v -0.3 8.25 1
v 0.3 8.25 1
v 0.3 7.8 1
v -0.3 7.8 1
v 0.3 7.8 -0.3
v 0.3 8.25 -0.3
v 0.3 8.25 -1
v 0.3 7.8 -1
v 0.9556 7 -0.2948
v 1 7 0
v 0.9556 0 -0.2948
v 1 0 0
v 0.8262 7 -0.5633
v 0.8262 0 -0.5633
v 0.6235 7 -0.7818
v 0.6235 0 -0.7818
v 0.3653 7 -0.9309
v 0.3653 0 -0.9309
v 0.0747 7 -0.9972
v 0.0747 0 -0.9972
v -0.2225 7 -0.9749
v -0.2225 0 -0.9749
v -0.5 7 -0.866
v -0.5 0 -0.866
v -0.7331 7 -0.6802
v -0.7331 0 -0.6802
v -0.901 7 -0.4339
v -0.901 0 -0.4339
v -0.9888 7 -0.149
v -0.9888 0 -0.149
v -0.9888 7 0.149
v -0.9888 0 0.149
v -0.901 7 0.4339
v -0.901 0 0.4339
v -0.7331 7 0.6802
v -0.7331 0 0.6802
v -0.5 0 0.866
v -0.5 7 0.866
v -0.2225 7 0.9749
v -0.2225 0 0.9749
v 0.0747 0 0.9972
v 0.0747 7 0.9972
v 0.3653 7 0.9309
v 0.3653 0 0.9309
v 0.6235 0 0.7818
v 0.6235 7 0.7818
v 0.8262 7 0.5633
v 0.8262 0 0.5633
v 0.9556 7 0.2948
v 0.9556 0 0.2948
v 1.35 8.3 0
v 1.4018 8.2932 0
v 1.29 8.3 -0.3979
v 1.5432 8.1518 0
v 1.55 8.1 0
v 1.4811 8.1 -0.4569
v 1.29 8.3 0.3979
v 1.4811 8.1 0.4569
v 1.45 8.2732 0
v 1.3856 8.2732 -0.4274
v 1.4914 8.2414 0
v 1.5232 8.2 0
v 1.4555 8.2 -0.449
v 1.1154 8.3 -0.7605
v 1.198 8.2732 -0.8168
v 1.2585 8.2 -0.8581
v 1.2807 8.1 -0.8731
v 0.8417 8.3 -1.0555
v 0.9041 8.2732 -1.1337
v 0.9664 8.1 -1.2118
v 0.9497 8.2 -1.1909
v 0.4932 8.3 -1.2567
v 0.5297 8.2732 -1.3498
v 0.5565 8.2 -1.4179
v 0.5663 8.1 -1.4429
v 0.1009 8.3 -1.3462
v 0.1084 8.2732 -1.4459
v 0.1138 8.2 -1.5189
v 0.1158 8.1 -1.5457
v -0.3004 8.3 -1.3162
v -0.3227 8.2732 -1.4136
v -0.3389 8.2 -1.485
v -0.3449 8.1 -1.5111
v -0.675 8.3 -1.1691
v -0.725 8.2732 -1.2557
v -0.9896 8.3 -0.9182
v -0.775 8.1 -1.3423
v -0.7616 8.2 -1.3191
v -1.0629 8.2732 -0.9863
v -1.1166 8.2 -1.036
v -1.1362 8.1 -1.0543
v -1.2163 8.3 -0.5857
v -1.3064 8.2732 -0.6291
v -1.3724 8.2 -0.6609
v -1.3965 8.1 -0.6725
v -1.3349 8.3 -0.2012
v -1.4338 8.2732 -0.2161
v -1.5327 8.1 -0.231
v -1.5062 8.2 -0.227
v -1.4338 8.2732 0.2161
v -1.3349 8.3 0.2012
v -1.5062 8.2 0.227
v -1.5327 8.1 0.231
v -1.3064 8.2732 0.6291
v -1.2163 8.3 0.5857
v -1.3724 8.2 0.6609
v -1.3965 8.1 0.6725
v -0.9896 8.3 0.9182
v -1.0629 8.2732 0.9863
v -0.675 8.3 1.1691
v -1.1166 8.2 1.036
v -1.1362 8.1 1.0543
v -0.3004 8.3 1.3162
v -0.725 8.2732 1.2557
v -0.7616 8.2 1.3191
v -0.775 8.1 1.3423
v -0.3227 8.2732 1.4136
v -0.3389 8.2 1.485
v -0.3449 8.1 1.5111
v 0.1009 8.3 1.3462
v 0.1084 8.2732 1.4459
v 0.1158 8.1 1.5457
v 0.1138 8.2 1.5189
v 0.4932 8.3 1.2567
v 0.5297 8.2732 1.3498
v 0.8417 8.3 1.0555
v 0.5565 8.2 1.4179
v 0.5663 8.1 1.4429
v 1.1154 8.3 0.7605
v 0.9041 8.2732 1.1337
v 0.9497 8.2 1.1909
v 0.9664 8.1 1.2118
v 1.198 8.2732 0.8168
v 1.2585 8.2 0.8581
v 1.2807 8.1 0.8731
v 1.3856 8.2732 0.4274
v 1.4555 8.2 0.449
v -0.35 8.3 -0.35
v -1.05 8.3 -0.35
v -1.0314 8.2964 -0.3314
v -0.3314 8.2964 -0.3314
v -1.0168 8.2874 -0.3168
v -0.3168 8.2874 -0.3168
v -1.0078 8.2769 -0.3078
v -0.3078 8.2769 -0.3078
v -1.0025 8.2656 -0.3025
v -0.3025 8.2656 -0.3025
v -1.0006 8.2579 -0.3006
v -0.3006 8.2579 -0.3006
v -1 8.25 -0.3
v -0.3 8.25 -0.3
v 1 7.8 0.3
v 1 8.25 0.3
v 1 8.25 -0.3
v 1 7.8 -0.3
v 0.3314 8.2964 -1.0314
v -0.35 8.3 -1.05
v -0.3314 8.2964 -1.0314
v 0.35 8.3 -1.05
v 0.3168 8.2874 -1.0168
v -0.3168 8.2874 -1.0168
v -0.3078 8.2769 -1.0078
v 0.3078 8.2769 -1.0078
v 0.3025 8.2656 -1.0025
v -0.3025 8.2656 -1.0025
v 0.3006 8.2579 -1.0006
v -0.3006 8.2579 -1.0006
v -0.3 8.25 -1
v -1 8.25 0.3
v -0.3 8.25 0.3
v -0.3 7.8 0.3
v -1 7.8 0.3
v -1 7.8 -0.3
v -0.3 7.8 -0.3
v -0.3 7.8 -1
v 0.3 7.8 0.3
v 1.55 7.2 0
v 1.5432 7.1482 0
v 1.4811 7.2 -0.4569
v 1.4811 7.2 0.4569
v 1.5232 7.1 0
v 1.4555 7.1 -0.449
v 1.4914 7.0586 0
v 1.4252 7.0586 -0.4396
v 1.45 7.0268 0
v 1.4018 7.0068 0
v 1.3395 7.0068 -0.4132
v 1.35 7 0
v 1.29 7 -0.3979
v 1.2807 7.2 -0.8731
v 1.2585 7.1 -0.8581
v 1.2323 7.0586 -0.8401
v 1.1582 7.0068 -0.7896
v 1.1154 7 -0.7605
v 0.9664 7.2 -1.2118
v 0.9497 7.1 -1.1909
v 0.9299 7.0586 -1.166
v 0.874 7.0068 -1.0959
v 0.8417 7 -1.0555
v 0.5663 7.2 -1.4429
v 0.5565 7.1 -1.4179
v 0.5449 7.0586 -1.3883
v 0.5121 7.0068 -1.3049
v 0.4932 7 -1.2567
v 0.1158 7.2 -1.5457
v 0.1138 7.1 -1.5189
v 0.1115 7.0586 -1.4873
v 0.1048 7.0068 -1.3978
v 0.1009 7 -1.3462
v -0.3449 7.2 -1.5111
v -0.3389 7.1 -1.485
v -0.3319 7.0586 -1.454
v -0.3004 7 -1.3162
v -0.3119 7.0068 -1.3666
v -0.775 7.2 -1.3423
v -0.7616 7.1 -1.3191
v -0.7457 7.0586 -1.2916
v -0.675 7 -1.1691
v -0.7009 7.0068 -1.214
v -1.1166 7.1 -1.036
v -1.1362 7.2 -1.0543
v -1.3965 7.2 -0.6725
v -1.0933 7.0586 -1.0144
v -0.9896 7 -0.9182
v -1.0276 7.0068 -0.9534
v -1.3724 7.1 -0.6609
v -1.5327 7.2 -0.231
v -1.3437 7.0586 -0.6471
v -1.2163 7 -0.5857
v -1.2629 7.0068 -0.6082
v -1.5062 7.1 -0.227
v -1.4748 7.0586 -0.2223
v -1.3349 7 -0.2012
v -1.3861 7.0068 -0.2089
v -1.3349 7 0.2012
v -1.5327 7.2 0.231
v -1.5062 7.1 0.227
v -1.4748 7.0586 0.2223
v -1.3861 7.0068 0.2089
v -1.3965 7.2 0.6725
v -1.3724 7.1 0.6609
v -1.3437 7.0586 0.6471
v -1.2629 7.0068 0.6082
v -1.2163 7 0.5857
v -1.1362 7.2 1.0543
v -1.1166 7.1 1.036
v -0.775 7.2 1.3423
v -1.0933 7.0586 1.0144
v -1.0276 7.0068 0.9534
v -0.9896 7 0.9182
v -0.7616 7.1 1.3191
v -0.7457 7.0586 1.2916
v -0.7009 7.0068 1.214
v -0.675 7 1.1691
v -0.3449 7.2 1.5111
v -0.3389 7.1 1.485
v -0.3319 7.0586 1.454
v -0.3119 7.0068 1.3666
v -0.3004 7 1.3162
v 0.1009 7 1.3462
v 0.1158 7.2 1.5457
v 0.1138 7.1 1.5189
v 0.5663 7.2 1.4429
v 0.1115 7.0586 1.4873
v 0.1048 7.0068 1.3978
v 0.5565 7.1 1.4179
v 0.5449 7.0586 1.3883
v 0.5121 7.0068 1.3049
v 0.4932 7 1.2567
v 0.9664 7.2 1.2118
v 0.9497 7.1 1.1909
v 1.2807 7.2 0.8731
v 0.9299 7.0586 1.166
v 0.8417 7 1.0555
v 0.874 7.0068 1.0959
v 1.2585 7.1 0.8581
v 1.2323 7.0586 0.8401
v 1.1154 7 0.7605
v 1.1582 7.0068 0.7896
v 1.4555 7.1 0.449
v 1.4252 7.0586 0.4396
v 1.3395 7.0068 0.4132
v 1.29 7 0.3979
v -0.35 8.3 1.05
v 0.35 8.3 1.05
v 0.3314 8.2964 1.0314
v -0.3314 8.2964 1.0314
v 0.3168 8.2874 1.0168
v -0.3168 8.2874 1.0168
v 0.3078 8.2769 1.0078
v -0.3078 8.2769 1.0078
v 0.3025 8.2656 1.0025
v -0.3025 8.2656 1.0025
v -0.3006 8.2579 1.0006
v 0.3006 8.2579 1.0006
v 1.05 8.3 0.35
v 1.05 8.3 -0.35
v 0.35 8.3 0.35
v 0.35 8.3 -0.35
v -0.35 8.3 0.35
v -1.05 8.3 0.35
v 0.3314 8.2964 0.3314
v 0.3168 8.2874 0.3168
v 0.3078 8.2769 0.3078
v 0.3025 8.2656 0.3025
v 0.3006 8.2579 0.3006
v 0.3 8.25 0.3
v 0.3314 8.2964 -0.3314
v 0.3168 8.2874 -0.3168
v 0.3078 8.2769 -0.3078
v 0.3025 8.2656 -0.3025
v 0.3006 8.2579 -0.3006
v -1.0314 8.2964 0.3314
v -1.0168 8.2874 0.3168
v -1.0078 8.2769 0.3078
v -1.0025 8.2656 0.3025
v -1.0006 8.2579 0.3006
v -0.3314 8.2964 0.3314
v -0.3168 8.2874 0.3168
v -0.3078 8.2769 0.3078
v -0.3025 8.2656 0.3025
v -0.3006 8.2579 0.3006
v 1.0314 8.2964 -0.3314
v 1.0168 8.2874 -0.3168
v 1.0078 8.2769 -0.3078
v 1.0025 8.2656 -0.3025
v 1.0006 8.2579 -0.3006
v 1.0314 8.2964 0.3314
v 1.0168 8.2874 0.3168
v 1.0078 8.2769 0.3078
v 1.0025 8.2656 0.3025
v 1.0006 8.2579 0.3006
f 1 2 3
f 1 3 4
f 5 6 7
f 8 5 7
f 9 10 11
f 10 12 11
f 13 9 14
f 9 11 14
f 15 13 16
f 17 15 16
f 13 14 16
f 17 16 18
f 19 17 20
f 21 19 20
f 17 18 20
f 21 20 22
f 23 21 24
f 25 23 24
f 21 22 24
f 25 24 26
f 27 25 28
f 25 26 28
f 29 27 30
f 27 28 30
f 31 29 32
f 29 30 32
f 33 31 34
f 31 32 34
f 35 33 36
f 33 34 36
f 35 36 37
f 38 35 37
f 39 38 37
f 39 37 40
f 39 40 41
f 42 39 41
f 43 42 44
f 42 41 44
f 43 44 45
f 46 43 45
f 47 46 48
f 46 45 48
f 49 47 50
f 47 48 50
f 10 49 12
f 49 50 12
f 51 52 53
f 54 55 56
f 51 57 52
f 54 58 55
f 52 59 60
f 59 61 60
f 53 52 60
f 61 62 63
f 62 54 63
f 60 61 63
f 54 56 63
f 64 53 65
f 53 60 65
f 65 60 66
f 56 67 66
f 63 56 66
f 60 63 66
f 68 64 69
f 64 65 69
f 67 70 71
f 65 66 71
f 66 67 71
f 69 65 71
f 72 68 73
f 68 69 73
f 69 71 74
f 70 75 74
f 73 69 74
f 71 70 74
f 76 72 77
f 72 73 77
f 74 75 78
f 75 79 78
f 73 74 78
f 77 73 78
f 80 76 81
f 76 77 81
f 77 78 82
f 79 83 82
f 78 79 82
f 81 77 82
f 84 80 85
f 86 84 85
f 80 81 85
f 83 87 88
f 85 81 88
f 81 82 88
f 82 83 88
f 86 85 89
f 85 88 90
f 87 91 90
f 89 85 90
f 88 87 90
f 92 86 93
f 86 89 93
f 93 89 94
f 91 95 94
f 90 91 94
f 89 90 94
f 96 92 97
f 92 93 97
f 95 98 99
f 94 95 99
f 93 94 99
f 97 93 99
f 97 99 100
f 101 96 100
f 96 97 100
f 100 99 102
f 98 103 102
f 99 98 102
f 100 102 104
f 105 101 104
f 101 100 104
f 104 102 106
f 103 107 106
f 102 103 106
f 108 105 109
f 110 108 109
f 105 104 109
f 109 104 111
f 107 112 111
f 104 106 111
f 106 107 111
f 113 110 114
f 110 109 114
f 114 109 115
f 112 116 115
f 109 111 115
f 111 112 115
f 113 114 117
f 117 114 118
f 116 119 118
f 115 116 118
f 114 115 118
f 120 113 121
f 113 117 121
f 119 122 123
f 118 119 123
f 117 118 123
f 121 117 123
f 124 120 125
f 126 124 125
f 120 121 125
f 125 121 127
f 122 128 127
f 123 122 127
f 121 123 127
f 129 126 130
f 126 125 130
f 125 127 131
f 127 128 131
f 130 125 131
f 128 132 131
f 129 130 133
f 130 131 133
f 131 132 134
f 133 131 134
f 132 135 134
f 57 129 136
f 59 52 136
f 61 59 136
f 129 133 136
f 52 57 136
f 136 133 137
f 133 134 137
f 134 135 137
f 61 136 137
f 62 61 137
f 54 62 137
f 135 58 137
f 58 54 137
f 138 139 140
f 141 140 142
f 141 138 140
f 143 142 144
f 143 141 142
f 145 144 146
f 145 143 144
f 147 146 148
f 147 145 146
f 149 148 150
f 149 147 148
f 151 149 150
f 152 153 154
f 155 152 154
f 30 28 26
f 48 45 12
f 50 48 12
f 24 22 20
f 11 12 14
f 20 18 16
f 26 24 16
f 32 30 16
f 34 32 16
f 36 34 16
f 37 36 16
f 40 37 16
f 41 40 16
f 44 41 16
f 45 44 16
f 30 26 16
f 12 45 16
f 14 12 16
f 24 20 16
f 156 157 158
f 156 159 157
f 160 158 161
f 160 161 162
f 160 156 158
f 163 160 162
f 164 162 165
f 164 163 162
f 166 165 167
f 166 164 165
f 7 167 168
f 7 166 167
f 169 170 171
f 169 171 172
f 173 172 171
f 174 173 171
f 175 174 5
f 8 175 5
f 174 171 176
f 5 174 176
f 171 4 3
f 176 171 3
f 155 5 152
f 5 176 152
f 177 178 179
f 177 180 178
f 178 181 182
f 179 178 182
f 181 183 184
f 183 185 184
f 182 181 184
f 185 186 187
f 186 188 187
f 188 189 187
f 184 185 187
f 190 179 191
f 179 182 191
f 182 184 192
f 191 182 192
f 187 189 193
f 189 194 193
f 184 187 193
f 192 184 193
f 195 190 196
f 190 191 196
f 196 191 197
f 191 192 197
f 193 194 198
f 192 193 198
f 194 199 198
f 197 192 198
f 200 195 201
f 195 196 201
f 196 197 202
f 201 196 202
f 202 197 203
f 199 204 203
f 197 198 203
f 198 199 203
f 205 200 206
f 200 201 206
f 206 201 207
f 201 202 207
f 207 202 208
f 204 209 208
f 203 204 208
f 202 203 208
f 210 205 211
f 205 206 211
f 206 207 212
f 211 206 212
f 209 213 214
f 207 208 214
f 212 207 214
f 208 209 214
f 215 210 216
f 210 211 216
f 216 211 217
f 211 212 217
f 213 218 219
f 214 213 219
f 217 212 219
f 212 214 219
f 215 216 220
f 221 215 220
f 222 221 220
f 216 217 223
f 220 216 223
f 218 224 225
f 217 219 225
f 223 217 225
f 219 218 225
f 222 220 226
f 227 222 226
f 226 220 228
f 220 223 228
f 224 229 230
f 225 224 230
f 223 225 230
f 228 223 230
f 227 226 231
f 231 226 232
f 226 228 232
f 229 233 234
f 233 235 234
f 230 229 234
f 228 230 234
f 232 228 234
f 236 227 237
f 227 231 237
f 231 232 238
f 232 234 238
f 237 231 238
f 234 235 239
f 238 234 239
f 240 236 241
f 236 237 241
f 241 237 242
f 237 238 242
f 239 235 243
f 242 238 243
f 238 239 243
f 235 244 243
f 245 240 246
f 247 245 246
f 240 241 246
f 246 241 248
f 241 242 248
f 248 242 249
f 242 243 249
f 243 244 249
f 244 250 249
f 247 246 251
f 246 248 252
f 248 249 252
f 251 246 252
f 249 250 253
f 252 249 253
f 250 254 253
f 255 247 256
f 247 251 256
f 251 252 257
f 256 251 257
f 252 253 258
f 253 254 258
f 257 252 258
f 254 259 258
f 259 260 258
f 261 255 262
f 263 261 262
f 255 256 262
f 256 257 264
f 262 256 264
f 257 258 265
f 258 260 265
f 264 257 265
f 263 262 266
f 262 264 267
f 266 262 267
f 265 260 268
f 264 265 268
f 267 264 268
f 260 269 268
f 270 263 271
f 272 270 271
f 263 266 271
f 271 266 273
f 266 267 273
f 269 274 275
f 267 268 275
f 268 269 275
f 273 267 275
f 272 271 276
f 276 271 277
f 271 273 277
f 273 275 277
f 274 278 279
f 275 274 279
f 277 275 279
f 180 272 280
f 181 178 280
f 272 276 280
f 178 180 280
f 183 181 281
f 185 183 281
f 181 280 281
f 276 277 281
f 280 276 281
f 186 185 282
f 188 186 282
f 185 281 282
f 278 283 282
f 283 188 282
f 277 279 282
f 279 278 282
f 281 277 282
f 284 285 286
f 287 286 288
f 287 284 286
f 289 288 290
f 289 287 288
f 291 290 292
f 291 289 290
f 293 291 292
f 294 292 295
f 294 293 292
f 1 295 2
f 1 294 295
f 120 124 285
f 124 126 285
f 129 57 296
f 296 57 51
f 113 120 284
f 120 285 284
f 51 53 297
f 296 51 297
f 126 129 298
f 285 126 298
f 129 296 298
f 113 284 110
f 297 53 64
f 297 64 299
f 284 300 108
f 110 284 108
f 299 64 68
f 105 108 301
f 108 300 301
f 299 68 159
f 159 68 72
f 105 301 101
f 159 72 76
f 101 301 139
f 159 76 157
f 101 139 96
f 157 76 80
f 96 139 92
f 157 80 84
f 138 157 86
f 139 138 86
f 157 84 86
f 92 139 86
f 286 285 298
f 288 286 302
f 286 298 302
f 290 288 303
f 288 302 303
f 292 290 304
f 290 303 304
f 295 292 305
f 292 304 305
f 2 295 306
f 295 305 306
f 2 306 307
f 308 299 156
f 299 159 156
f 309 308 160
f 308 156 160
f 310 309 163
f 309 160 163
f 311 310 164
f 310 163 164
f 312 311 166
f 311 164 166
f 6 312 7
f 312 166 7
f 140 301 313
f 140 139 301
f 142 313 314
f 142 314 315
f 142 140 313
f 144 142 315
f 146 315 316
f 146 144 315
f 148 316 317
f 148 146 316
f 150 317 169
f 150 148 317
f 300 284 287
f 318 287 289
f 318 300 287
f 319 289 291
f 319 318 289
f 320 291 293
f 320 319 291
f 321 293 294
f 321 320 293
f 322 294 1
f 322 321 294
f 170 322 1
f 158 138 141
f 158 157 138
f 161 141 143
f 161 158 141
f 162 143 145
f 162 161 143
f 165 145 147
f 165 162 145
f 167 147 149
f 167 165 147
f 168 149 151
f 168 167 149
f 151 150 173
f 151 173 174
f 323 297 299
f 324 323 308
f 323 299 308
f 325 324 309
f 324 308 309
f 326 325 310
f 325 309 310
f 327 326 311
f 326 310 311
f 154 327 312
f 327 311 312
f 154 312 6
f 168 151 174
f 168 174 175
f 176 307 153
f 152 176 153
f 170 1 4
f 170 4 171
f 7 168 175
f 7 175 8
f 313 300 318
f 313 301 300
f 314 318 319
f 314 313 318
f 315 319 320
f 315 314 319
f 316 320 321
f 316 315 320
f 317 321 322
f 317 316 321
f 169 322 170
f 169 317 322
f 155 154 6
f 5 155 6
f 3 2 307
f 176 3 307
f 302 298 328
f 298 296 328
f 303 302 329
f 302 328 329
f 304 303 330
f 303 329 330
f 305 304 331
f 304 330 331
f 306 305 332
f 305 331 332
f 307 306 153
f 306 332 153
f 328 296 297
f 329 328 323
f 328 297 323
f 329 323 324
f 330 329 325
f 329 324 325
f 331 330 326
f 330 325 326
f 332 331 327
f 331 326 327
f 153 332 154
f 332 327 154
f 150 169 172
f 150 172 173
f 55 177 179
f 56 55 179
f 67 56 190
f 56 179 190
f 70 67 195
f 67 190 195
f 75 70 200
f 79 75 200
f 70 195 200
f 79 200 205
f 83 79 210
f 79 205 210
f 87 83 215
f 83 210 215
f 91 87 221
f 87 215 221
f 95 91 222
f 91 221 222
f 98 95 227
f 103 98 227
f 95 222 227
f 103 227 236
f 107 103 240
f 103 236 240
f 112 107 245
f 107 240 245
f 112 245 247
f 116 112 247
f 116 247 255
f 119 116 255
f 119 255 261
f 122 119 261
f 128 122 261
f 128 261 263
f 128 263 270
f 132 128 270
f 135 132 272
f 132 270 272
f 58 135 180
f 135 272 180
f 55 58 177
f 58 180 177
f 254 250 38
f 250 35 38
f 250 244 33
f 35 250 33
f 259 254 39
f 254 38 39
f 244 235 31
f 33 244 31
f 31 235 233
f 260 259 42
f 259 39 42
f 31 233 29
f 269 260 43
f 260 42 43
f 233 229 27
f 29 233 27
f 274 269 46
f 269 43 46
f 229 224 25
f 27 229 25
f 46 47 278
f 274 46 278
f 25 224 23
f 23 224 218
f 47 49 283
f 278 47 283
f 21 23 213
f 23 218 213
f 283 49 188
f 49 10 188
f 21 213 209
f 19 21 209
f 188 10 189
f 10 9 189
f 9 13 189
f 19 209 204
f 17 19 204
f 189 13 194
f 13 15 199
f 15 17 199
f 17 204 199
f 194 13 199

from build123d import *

# Parameters (mm, degrees)
FILLET_R     = 0.2
POCKET_DEPTH = 0.5
FILLET001_R  = 0.05


with BuildPart() as part:
    # Sketch → Revolution (revolve)
    with BuildSketch(Plane.XY):
        Polygon((0, 0), (0, 8.3), (1.55, 8.3), (1.55, 7), (1, 7), (1, 0), align=None)
    revolve(axis=Axis((0, 0, 0), (0, 1, 0)))

    # Fillet
    fillet_edges = [part.edges().sort_by_distance(p)[0] for p in [
        (-1.55, 8.3, 0),
        (-1.55, 7, 0),
    ]]
    fillet(fillet_edges, radius=FILLET_R)

    # Sketch001 (on Face1 of Fillet) → Pocket (cut)
    with BuildSketch(Plane(origin=(0, 8.3, 0), x_dir=(-1, 0, 0), z_dir=(0, 1, 0))):
        Polygon((0, 1), (0.3, 1), (0.3, 0.3), (1, 0.3), (1, -0.3), (0.3, -0.3), (0.3, -1), (0, -1), align=None)
    pocket = extrude(amount=-POCKET_DEPTH, mode=Mode.SUBTRACT)

    # Mirrored: Pocket across Sketch001 V_Axis
    add(pocket.mirror(Plane(origin=(0, 8.3, 0), x_dir=(0, 1, 0), z_dir=(-1, 0, 0))), mode=Mode.SUBTRACT)

    # Fillet001
    fillet001_edges = [part.edges().sort_by_distance(p)[0] for p in [
        (-0.65, 8.3, 0.3),
        (-1, 8.3, 0),
        (-0.65, 8.3, -0.3),
        (-0.3, 8.3, -0.65),
        (-0.15, 8.3, -1),
        (0.15, 8.3, -1),
        (0.3, 8.3, -0.65),
        (0.65, 8.3, -0.3),
        (0.65, 8.3, 0.3),
        (1, 8.3, 0),
        (0.3, 8.3, 0.65),
        (-0.3, 8.3, 0.65),
        (-0.15, 8.3, 1),
        (0.15, 8.3, 1),
    ]]
    fillet(fillet001_edges, radius=FILLET001_R)


solid = part.part
